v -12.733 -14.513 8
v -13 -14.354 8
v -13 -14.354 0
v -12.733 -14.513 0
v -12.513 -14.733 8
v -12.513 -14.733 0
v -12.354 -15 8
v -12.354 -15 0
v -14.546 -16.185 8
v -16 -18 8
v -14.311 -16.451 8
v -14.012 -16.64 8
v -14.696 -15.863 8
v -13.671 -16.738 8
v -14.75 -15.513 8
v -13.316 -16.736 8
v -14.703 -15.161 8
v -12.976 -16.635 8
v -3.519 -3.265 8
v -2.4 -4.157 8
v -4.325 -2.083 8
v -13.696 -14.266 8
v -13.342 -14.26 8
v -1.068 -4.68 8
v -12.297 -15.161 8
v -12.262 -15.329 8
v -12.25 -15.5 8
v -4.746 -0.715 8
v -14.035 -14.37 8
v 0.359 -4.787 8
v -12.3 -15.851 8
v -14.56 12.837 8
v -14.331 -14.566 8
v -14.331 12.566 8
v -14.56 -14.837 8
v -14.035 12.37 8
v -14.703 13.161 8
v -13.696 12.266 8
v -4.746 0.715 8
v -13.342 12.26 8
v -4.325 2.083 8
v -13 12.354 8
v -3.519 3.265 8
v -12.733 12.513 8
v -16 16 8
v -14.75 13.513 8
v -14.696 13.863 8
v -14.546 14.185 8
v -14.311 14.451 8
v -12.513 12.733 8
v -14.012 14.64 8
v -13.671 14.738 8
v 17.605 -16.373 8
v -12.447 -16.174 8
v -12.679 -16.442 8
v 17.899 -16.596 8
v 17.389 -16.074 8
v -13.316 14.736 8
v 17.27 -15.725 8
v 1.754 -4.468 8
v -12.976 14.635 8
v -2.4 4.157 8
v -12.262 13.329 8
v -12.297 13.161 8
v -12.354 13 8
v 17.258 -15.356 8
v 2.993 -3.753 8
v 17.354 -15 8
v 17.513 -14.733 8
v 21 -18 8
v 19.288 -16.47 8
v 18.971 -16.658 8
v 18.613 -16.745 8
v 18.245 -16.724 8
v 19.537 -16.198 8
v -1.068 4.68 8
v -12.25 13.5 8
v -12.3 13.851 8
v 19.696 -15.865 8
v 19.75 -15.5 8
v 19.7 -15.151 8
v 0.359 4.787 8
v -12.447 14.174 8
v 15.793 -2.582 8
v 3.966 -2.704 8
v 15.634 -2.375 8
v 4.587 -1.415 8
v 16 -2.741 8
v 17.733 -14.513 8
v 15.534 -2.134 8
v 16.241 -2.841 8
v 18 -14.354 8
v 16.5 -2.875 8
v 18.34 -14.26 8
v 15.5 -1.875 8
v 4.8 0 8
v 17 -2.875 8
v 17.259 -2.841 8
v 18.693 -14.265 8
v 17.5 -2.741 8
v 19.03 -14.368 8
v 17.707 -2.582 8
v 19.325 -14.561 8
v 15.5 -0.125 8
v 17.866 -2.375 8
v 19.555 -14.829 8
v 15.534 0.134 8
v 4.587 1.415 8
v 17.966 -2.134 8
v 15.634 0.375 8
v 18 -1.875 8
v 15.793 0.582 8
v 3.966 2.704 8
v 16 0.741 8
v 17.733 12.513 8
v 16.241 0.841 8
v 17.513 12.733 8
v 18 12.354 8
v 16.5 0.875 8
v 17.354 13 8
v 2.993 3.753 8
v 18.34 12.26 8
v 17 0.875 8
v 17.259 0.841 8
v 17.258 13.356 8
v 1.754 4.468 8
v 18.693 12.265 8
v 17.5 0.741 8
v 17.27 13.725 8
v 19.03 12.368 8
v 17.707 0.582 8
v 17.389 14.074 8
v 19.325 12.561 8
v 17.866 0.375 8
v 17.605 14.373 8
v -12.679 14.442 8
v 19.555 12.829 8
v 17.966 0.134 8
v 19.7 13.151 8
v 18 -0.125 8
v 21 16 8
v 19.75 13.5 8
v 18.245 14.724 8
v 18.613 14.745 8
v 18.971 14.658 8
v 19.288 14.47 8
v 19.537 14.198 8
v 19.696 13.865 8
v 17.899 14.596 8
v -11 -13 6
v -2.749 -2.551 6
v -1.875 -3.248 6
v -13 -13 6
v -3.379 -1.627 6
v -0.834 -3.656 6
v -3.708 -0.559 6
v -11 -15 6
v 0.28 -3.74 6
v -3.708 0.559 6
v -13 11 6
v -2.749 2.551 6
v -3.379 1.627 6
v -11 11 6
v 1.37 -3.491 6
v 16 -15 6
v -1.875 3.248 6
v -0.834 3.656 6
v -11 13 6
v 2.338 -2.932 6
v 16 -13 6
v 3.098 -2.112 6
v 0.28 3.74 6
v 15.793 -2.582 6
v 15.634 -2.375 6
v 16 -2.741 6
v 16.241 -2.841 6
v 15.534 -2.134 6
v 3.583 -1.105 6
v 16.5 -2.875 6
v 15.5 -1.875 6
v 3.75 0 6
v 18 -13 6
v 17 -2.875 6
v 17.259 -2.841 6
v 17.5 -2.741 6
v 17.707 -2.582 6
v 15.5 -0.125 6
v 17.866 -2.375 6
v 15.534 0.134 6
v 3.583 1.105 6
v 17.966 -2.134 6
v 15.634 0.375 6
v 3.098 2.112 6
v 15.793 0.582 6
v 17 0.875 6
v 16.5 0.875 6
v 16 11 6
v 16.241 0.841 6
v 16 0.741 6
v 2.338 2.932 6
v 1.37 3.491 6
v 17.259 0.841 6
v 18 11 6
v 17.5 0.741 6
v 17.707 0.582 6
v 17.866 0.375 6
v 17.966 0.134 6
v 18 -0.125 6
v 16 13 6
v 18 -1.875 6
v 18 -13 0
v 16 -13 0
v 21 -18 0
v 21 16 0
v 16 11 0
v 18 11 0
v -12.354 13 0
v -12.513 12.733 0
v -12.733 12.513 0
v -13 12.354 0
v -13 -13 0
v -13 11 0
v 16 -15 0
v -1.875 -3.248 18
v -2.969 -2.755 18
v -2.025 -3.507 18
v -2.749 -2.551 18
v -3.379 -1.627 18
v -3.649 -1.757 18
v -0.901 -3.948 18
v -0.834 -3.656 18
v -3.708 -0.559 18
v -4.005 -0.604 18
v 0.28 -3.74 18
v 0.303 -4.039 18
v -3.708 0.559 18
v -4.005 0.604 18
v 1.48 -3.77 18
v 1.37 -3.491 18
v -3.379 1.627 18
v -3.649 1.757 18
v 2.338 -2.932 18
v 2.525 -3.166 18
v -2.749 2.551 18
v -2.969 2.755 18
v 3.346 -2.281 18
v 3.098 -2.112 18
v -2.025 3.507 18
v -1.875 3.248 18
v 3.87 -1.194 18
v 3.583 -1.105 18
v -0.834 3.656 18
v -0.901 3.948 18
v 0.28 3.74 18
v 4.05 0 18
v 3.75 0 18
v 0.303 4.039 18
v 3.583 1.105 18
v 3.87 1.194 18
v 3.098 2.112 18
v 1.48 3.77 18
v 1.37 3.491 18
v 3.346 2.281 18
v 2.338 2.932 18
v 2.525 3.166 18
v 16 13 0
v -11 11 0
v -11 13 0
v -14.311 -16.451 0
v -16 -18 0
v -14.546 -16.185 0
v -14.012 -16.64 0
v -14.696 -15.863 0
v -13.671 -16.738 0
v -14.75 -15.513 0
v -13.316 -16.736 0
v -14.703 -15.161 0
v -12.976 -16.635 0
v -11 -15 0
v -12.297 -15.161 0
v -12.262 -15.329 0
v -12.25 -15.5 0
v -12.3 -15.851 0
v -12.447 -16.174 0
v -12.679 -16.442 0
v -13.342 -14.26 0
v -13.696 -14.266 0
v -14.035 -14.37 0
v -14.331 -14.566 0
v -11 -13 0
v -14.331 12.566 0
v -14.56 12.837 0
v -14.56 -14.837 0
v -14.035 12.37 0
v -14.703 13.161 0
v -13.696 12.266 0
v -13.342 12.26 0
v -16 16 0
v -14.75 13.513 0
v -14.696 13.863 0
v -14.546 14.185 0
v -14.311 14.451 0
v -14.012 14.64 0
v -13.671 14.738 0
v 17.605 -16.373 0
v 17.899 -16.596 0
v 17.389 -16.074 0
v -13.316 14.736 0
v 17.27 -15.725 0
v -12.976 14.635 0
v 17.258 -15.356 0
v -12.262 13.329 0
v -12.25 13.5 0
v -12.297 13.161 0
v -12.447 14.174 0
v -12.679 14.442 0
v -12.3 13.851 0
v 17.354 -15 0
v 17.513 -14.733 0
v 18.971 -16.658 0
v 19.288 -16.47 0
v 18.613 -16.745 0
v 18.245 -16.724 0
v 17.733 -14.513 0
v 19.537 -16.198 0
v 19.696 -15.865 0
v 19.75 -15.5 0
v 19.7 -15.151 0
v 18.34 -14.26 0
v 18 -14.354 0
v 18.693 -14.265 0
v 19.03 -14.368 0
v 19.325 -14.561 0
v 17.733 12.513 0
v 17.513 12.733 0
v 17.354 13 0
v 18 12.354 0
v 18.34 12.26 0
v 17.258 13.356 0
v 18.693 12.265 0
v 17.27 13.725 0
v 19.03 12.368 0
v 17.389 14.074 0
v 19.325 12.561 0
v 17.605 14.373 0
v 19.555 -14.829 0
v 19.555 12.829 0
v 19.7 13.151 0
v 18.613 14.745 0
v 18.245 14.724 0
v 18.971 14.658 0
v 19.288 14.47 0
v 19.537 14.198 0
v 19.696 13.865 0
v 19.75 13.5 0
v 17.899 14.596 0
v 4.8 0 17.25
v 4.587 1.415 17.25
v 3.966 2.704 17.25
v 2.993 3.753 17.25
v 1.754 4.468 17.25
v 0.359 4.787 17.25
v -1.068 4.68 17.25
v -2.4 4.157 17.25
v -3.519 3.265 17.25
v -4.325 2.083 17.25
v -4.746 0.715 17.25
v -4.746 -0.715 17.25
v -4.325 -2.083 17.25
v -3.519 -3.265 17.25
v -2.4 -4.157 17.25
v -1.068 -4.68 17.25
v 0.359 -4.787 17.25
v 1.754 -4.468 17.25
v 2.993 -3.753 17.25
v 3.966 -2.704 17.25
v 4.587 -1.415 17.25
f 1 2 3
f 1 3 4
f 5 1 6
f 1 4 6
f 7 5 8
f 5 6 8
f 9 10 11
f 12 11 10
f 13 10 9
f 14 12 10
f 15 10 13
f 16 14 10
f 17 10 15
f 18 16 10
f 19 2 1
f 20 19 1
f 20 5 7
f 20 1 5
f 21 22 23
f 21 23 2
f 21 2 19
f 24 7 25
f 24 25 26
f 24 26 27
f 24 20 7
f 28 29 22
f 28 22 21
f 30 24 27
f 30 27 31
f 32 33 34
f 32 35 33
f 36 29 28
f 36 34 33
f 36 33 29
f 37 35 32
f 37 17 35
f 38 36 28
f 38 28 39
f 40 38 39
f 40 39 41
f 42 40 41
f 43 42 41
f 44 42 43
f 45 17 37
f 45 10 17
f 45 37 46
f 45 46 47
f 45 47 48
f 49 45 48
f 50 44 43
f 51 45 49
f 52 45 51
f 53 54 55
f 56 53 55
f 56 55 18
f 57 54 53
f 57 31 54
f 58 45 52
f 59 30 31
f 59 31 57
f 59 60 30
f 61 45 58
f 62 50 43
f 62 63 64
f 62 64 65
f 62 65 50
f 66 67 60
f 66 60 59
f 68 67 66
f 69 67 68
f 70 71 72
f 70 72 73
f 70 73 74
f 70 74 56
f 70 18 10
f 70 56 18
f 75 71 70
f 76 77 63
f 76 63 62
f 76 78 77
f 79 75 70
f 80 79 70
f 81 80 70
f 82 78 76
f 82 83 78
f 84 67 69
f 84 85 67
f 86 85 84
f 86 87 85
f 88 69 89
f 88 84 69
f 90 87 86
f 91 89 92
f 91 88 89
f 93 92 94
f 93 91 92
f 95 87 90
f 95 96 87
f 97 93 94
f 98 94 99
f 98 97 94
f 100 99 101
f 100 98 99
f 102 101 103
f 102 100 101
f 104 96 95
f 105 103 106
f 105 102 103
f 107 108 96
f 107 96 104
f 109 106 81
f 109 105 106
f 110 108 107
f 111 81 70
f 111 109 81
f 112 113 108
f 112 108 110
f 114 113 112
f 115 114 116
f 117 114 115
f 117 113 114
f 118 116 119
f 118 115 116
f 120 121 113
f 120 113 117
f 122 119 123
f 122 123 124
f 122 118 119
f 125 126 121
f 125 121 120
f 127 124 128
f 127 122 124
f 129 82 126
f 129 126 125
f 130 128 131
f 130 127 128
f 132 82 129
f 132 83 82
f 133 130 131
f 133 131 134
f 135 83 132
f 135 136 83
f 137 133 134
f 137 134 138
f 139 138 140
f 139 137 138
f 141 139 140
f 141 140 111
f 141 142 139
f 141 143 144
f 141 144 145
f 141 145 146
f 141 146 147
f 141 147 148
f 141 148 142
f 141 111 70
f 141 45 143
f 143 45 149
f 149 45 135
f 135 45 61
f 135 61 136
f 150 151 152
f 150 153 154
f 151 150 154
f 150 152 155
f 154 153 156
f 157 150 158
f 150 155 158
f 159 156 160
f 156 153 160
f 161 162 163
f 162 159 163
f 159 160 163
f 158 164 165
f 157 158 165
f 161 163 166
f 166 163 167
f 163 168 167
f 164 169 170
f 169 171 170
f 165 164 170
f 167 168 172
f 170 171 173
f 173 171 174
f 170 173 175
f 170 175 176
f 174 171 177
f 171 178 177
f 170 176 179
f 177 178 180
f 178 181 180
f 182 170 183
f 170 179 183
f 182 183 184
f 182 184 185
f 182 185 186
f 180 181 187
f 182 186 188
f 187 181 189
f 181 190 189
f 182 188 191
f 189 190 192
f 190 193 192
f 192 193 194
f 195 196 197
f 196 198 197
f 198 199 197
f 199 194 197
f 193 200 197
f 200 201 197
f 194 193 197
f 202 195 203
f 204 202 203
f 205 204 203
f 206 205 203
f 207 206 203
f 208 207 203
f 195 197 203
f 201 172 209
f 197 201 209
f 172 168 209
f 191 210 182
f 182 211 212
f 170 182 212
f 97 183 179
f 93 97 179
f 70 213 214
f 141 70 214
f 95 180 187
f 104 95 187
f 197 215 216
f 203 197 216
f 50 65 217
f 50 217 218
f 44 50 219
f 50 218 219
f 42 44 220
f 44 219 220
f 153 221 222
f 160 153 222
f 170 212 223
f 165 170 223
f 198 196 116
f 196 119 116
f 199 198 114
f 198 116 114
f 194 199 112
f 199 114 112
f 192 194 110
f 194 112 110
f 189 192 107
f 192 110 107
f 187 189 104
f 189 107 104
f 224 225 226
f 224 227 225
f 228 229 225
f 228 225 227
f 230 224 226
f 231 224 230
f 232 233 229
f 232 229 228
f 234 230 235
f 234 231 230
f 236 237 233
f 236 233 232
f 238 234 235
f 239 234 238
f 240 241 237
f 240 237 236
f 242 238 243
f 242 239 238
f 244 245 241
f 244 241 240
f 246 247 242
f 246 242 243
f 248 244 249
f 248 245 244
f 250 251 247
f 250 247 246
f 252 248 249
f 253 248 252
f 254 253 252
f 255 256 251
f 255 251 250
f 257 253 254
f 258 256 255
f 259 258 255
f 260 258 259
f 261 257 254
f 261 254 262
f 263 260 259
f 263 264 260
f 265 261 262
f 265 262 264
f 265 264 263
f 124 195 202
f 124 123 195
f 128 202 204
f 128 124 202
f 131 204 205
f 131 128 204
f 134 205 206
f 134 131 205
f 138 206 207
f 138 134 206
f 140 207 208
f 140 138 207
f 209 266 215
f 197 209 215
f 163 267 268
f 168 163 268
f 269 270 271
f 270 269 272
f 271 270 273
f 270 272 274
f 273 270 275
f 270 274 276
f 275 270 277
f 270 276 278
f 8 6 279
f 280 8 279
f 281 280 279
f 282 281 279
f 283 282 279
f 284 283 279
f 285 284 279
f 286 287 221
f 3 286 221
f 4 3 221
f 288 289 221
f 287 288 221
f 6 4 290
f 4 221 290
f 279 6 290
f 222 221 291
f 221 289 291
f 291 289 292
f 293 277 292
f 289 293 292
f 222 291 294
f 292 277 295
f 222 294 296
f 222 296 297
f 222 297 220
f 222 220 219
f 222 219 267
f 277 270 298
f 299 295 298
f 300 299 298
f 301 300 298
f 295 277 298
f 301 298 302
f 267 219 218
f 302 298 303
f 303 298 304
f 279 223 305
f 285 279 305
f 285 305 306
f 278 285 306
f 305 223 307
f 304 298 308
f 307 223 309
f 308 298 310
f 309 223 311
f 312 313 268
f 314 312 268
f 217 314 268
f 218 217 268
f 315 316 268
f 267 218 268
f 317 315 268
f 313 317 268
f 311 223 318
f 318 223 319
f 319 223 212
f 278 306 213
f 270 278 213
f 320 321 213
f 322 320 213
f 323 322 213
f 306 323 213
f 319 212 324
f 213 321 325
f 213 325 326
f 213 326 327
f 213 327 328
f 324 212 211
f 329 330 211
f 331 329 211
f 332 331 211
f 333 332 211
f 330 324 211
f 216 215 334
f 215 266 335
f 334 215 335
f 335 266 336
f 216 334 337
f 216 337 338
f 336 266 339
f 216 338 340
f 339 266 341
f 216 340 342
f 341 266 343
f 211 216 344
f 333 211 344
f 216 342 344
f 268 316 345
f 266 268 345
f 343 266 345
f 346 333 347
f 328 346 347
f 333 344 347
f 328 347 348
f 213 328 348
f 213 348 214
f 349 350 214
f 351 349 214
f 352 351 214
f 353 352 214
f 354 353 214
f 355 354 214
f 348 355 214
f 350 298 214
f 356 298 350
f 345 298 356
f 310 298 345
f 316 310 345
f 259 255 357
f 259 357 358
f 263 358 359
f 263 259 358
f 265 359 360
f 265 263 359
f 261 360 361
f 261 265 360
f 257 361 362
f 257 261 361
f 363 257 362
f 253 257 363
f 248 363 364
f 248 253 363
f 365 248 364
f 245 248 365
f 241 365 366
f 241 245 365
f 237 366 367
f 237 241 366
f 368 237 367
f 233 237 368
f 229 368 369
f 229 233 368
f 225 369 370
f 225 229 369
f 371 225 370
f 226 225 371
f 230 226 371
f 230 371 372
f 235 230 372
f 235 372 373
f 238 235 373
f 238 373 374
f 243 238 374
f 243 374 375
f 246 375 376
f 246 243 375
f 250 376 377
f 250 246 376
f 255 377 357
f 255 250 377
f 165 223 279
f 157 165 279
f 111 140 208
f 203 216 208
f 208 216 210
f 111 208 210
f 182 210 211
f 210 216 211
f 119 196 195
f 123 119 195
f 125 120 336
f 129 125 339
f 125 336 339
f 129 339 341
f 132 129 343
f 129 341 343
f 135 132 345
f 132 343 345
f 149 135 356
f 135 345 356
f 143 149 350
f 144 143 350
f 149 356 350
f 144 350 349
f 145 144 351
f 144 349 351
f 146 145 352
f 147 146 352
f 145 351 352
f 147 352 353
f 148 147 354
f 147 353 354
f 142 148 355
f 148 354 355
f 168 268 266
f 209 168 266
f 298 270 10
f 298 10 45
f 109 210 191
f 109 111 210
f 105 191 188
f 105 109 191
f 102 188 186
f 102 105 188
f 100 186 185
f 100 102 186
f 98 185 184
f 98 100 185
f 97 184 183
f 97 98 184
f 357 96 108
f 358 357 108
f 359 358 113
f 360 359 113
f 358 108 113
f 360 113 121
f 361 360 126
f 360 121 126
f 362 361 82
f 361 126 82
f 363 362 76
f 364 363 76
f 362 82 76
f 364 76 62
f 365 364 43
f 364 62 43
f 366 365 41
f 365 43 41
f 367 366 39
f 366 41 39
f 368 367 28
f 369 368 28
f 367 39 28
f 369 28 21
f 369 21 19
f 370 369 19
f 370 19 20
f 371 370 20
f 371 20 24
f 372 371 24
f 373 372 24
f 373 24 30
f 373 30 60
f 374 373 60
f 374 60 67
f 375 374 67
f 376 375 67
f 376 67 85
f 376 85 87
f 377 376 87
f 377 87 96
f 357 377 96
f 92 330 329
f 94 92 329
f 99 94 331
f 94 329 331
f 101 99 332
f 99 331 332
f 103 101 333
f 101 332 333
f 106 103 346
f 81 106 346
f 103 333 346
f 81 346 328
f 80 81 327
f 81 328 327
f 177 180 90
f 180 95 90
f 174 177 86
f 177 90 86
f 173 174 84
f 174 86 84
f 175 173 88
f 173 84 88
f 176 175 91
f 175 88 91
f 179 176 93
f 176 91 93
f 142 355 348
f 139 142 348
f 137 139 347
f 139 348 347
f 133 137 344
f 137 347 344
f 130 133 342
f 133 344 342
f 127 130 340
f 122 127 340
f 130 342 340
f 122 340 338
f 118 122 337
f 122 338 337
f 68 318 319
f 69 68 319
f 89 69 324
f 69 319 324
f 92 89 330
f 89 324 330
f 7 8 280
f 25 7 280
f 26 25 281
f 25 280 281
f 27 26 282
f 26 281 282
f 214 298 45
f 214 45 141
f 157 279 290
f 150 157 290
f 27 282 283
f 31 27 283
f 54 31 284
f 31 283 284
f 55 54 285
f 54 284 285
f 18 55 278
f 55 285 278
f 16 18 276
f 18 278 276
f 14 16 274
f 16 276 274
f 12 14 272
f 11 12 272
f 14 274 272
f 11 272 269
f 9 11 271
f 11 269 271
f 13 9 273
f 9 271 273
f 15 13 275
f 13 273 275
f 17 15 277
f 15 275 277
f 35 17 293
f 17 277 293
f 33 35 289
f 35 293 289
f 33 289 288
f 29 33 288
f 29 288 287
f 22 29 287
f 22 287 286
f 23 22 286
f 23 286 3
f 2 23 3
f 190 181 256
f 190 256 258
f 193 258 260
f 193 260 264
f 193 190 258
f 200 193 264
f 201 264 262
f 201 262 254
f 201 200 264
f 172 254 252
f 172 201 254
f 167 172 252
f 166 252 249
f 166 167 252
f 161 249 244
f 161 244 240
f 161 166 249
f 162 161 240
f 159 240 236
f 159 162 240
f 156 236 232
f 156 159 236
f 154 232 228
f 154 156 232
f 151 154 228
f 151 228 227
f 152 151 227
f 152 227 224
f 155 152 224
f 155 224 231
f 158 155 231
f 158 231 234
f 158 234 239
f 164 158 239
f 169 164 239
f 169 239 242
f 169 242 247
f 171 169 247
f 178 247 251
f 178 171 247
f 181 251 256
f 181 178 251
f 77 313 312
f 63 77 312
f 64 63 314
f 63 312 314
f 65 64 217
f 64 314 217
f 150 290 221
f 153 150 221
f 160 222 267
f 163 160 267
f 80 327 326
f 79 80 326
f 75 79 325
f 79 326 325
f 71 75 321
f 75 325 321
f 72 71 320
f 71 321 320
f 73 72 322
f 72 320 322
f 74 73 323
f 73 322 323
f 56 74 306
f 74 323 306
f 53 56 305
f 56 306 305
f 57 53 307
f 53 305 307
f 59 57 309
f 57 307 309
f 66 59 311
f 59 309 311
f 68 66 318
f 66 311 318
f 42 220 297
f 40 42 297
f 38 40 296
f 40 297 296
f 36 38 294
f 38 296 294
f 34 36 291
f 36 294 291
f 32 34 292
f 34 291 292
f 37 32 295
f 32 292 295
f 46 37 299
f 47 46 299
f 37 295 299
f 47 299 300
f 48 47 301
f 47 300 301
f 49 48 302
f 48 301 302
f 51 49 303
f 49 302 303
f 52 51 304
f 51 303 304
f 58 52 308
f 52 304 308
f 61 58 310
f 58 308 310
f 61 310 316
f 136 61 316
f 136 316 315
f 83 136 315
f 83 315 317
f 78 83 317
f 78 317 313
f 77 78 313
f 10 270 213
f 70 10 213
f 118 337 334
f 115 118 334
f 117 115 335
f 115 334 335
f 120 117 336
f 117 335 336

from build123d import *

# Parameters (mm, degrees)
F0_W     = 37
F0_H     = 34
F1_DEPTH = 8
F2_START = 6
F0_R     = 4.8
F2_DEPTH = 2
F3_R     = 1
F4_START = 6
F0_R_2   = 3.75
F4_DEPTH = 12
F5_SIZE  = 0.75


with BuildPart() as f1:
    # F0 (on Top) → F1 (new body)
    with BuildSketch(Plane.XY):
        with Locations((2.5, -1)):
            Rectangle(F0_W, F0_H)
        with BuildLine():
            Line((-12.3543560763, 13), (-11, 13))
            Line((-11, 13), (16, 13))
            Line((16, 13), (17.3543560763, 13))
            ThreePointArc((17.3543560763, 13), (18.2446129454, 14.7236328912), (19.75, 13.5))
            ThreePointArc((19.75, 13.5), (19.1846531969, 12.4541749668), (18, 12.3543560763))
            Line((18, 12.3543560763), (18, 11))
            Line((18, 11), (18, 0.875))
            Line((18, 0.875), (18, -2.875))
            Line((18, -2.875), (18, -13))
            Line((18, -13), (18, -14.3543560763))
            ThreePointArc((18, -14.3543560763), (19.1846531969, -14.4541749668), (19.75, -15.5))
            ThreePointArc((19.75, -15.5), (18.2446129454, -16.7236328912), (17.3543560763, -15))
            Line((17.3543560763, -15), (16, -15))
            Line((16, -15), (-11, -15))
            Line((-11, -15), (-12.3543560763, -15))
            ThreePointArc((-12.3543560763, -15), (-12.2763671088, -15.2446129454), (-12.25, -15.5))
            ThreePointArc((-12.25, -15.5), (-14.5458250332, -16.1846531969), (-13, -14.3543560763))
            Line((-13, -14.3543560763), (-13, -13))
            Line((-13, -13), (-13, 11))
            Line((-13, 11), (-13, 12.3543560763))
            ThreePointArc((-13, 12.3543560763), (-14.5458250332, 14.1846531969), (-12.25, 13.5))
            ThreePointArc((-12.25, 13.5), (-12.2763671088, 13.2446129454), (-12.3543560763, 13))
        make_face(mode=Mode.SUBTRACT)
        with BuildLine():
            Line((-11, -13), (-13, -13))
            Line((-13, -13), (-13, -14.3543560763))
            ThreePointArc((-13, -14.3543560763), (-12.6161165235, -14.6161165235), (-12.3543560763, -15))
            Line((-12.3543560763, -15), (-11, -15))
            Line((-11, -15), (-11, -13))
        make_face()
        with BuildLine():
            Line((18, -14.3543560763), (18, -13))
            Line((18, -13), (16, -13))
            Line((16, -13), (16, -15))
            Line((16, -15), (17.3543560763, -15))
            ThreePointArc((17.3543560763, -15), (17.6161165235, -14.6161165235), (18, -14.3543560763))
        make_face()
        with BuildLine():
            Line((17.3543560763, 13), (16, 13))
            Line((16, 13), (16, 11))
            Line((16, 11), (18, 11))
            Line((18, 11), (18, 12.3543560763))
            ThreePointArc((18, 12.3543560763), (17.6161165235, 12.6161165235), (17.3543560763, 13))
        make_face()
        with BuildLine():
            Line((-11, 11), (-11, 13))
            Line((-11, 13), (-12.3543560763, 13))
            ThreePointArc((-12.3543560763, 13), (-12.6161165235, 12.6161165235), (-13, 12.3543560763))
            Line((-13, 12.3543560763), (-13, 11))
            Line((-13, 11), (-11, 11))
        make_face()
    extrude(amount=F1_DEPTH)

    # F0 (on Top) → F2 (join)
    with BuildSketch(Plane.XY.offset(F2_START)):
        Polygon((16, 13), (-11, 13), (-11, 11), (-13, 11), (-13, -13), (-11, -13), (-11, -15), (16, -15), (16, -13), (18, -13), (18, -2.875), (15.5, -2.875), (15.5, 0.875), (18, 0.875), (18, 11), (16, 11), align=None)
        Circle(F0_R, mode=Mode.SUBTRACT)
    extrude(amount=F2_DEPTH)

    # F3
    f3_edges = [f1.edges().sort_by_distance(p)[0] for p in [
        (15.5, 0.875, 7),
        (18, 0.875, 7),
        (15.5, -2.875, 7),
        (18, -2.875, 7),
    ]]
    fillet(f3_edges, radius=F3_R)

    # F0 (on Top) → F4 (join)
    with BuildSketch(Plane.XY.offset(F4_START)):
        Circle(F0_R)
        Circle(F0_R_2, mode=Mode.SUBTRACT)
    extrude(amount=F4_DEPTH)

    # F5
    f5_edges = [f1.edges().sort_by_distance(p)[0] for p in [
        (-4.8, 0, 18),
    ]]
    chamfer(f5_edges, length=F5_SIZE)


solid = f1.part
